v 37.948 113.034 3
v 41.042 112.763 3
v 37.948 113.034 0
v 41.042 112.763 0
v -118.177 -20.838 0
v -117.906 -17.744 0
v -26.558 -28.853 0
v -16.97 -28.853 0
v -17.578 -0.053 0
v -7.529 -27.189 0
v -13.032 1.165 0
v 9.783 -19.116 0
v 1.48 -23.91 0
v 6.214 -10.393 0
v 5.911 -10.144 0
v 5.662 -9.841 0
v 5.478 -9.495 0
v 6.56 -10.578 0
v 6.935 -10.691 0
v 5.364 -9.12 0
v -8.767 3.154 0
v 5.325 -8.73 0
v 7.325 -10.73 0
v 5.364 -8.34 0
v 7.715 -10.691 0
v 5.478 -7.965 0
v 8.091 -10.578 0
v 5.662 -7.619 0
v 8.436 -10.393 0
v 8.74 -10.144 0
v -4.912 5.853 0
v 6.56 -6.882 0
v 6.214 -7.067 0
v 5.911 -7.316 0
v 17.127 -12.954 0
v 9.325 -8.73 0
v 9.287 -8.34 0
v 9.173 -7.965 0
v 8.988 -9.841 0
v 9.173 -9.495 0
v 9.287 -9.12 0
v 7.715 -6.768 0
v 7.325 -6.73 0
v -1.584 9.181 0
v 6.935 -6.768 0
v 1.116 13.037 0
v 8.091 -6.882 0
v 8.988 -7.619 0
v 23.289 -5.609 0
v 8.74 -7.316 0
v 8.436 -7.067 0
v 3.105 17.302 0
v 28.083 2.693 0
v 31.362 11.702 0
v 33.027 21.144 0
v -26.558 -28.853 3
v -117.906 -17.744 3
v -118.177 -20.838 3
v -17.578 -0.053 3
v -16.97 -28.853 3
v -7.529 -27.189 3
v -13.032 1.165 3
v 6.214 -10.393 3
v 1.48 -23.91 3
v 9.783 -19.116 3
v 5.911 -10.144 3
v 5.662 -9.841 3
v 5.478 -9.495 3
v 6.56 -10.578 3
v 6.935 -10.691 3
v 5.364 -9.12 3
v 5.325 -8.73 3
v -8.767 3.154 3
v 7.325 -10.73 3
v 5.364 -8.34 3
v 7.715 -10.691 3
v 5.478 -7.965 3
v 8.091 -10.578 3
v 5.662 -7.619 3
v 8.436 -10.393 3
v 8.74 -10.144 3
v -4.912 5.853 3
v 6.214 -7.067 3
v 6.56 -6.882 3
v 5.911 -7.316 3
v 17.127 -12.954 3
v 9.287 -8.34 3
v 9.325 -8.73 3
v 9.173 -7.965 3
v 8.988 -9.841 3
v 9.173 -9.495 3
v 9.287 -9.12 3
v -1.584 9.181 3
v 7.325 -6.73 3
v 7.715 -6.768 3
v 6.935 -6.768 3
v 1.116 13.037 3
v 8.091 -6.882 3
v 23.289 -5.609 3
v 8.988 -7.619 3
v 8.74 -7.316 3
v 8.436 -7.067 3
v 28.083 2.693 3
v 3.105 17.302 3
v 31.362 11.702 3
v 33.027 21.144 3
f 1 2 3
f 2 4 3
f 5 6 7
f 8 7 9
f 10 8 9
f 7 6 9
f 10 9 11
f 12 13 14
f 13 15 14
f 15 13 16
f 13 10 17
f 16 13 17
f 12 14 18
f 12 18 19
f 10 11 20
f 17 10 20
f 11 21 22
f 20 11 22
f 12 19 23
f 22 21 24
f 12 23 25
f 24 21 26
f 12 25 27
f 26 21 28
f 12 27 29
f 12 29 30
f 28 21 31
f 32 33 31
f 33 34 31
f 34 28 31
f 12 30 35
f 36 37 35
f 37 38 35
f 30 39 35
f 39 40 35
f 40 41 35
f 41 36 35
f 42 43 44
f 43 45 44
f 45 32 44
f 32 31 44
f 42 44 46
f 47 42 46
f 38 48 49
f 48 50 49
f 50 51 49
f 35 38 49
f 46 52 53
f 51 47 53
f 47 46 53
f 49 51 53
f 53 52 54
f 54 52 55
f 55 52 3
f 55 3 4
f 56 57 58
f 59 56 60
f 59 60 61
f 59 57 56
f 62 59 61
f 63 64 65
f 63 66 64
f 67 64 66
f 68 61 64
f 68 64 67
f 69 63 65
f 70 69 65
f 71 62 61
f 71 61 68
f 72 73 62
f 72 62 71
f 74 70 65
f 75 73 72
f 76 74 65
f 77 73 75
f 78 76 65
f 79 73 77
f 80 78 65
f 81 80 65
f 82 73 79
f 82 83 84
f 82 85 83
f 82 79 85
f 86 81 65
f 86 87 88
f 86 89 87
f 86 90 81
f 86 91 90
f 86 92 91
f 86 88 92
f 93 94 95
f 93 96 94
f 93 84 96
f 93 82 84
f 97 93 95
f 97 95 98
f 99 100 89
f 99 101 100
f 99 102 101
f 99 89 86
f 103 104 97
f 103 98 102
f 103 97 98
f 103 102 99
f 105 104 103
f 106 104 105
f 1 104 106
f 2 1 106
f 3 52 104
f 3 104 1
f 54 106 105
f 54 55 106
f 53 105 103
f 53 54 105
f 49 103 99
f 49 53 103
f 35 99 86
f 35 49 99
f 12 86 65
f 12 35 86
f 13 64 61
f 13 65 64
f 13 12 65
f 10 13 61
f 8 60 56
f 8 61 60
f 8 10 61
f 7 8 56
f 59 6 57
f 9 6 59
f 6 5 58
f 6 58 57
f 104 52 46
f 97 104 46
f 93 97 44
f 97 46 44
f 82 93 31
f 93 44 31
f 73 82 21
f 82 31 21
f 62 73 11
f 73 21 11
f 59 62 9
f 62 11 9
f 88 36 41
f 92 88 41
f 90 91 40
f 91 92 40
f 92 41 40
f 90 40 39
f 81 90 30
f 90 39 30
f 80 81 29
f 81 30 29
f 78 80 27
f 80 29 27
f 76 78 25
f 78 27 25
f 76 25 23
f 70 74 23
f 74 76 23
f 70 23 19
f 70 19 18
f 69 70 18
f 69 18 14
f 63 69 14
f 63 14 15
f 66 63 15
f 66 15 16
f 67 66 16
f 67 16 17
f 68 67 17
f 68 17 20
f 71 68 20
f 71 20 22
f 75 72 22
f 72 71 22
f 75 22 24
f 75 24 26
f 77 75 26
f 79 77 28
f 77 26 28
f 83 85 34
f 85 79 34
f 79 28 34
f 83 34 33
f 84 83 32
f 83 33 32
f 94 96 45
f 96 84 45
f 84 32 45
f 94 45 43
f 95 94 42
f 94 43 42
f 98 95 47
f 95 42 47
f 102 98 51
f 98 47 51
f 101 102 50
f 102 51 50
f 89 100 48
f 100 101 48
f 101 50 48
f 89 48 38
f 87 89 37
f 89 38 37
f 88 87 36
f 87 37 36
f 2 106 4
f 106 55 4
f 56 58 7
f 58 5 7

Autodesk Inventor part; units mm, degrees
ref_plane "YZ Plane" through (0, 0, 0) normal (1, 0, 0) x (0, 1, 0)
ref_plane "XZ Plane" through (0, 0, 0) normal (0, 1, 0) x (-1, 0, 0)
ref_plane "XY Plane" through (0, 0, 0) normal (0, 0, 1) x (1, 0, 0)
sketch "草圖1" plane through (0, 0, 0) normal (0, 0, 1) x (1, 0, 0)
  arc A0 (-17.0574, -3.0077) -> (5.924, 16.276) centre (-22.2668, 26.5366) ccw
  line L0 (5.924, 16.276) -> (41.0424, 112.7631)
  line L1 (-118.1769, -20.8378) -> (-17.0574, -3.0077)
  line L2 (-118.1769, -20.8378) -> (-26.5575, -28.8534)
  arc A1 (-26.5575, -28.8534) -> (33.0268, 21.1437) centre (-21.764, 25.9373) ccw
  line L3 (33.0268, 21.1437) -> (41.0424, 112.7631)
  circle A2 centre (7.3253, -8.7299) radius 2
  arc A3 (-17.5783, -0.0533) -> (3.1049, 17.302) centre (-22.2668, 26.5366) ccw
  line L4 (3.1049, 17.302) -> (46.017, 135.2022)
  line L5 (46.017, 135.2022) -> (36.0153, 20.8822)
  arc A4 (-26.819, -31.842) -> (36.0153, 20.8822) centre (-21.764, 25.9373) ccw
  line L6 (-26.819, -31.842) -> (-141.1389, -21.8403)
  line L7 (-141.1389, -21.8403) -> (-17.5783, -0.0533)
  line L8 (41.0424, 112.7631) -> (37.9484, 113.0338)
  line L9 (-118.1769, -20.8378) -> (-117.9062, -17.7438)
  point P0 (0, 0)
  dimension "d0" = 55
  dimension "d1" = 4
  dimension "d2" = 23
  dimension "d3" = 23
  dimension "d6" = 3
extrude "擠出1" add sketch "草圖1" along normal blind 3 contours L1 L9 L7 A3 L4 L8 L0 A0 | A0 L0 L3 A1 L2 L1
sketch "草圖2" plane through (0, 0, 3) normal (0, 0, 1) x (1, 0, 0)
  arc A0 (-26.5575, -28.8534) -> (33.0268, 21.1437) centre (-21.764, 25.9373) ccw projected
  line L0 (33.0268, 21.1437) -> (41.0424, 112.7631) projected
  line L1 (41.0424, 112.7631) -> (37.9484, 113.0338) projected
  line L2 (37.9484, 113.0338) -> (3.1049, 17.302) projected
  arc A1 (-17.5783, -0.0533) -> (3.1049, 17.302) centre (-22.2668, 26.5366) ccw projected
  line L3 (-17.5783, -0.0533) -> (-117.9062, -17.7438) projected
  line L4 (-117.9062, -17.7438) -> (-118.1769, -20.8378) projected
  line L5 (-118.1769, -20.8378) -> (-26.5575, -28.8534) projected
  circle A2 centre (7.3253, -8.7299) radius 2 projected
  point P0 (0, 0)
equation "\"d3\" = d2"
properties part number "sus_2"
